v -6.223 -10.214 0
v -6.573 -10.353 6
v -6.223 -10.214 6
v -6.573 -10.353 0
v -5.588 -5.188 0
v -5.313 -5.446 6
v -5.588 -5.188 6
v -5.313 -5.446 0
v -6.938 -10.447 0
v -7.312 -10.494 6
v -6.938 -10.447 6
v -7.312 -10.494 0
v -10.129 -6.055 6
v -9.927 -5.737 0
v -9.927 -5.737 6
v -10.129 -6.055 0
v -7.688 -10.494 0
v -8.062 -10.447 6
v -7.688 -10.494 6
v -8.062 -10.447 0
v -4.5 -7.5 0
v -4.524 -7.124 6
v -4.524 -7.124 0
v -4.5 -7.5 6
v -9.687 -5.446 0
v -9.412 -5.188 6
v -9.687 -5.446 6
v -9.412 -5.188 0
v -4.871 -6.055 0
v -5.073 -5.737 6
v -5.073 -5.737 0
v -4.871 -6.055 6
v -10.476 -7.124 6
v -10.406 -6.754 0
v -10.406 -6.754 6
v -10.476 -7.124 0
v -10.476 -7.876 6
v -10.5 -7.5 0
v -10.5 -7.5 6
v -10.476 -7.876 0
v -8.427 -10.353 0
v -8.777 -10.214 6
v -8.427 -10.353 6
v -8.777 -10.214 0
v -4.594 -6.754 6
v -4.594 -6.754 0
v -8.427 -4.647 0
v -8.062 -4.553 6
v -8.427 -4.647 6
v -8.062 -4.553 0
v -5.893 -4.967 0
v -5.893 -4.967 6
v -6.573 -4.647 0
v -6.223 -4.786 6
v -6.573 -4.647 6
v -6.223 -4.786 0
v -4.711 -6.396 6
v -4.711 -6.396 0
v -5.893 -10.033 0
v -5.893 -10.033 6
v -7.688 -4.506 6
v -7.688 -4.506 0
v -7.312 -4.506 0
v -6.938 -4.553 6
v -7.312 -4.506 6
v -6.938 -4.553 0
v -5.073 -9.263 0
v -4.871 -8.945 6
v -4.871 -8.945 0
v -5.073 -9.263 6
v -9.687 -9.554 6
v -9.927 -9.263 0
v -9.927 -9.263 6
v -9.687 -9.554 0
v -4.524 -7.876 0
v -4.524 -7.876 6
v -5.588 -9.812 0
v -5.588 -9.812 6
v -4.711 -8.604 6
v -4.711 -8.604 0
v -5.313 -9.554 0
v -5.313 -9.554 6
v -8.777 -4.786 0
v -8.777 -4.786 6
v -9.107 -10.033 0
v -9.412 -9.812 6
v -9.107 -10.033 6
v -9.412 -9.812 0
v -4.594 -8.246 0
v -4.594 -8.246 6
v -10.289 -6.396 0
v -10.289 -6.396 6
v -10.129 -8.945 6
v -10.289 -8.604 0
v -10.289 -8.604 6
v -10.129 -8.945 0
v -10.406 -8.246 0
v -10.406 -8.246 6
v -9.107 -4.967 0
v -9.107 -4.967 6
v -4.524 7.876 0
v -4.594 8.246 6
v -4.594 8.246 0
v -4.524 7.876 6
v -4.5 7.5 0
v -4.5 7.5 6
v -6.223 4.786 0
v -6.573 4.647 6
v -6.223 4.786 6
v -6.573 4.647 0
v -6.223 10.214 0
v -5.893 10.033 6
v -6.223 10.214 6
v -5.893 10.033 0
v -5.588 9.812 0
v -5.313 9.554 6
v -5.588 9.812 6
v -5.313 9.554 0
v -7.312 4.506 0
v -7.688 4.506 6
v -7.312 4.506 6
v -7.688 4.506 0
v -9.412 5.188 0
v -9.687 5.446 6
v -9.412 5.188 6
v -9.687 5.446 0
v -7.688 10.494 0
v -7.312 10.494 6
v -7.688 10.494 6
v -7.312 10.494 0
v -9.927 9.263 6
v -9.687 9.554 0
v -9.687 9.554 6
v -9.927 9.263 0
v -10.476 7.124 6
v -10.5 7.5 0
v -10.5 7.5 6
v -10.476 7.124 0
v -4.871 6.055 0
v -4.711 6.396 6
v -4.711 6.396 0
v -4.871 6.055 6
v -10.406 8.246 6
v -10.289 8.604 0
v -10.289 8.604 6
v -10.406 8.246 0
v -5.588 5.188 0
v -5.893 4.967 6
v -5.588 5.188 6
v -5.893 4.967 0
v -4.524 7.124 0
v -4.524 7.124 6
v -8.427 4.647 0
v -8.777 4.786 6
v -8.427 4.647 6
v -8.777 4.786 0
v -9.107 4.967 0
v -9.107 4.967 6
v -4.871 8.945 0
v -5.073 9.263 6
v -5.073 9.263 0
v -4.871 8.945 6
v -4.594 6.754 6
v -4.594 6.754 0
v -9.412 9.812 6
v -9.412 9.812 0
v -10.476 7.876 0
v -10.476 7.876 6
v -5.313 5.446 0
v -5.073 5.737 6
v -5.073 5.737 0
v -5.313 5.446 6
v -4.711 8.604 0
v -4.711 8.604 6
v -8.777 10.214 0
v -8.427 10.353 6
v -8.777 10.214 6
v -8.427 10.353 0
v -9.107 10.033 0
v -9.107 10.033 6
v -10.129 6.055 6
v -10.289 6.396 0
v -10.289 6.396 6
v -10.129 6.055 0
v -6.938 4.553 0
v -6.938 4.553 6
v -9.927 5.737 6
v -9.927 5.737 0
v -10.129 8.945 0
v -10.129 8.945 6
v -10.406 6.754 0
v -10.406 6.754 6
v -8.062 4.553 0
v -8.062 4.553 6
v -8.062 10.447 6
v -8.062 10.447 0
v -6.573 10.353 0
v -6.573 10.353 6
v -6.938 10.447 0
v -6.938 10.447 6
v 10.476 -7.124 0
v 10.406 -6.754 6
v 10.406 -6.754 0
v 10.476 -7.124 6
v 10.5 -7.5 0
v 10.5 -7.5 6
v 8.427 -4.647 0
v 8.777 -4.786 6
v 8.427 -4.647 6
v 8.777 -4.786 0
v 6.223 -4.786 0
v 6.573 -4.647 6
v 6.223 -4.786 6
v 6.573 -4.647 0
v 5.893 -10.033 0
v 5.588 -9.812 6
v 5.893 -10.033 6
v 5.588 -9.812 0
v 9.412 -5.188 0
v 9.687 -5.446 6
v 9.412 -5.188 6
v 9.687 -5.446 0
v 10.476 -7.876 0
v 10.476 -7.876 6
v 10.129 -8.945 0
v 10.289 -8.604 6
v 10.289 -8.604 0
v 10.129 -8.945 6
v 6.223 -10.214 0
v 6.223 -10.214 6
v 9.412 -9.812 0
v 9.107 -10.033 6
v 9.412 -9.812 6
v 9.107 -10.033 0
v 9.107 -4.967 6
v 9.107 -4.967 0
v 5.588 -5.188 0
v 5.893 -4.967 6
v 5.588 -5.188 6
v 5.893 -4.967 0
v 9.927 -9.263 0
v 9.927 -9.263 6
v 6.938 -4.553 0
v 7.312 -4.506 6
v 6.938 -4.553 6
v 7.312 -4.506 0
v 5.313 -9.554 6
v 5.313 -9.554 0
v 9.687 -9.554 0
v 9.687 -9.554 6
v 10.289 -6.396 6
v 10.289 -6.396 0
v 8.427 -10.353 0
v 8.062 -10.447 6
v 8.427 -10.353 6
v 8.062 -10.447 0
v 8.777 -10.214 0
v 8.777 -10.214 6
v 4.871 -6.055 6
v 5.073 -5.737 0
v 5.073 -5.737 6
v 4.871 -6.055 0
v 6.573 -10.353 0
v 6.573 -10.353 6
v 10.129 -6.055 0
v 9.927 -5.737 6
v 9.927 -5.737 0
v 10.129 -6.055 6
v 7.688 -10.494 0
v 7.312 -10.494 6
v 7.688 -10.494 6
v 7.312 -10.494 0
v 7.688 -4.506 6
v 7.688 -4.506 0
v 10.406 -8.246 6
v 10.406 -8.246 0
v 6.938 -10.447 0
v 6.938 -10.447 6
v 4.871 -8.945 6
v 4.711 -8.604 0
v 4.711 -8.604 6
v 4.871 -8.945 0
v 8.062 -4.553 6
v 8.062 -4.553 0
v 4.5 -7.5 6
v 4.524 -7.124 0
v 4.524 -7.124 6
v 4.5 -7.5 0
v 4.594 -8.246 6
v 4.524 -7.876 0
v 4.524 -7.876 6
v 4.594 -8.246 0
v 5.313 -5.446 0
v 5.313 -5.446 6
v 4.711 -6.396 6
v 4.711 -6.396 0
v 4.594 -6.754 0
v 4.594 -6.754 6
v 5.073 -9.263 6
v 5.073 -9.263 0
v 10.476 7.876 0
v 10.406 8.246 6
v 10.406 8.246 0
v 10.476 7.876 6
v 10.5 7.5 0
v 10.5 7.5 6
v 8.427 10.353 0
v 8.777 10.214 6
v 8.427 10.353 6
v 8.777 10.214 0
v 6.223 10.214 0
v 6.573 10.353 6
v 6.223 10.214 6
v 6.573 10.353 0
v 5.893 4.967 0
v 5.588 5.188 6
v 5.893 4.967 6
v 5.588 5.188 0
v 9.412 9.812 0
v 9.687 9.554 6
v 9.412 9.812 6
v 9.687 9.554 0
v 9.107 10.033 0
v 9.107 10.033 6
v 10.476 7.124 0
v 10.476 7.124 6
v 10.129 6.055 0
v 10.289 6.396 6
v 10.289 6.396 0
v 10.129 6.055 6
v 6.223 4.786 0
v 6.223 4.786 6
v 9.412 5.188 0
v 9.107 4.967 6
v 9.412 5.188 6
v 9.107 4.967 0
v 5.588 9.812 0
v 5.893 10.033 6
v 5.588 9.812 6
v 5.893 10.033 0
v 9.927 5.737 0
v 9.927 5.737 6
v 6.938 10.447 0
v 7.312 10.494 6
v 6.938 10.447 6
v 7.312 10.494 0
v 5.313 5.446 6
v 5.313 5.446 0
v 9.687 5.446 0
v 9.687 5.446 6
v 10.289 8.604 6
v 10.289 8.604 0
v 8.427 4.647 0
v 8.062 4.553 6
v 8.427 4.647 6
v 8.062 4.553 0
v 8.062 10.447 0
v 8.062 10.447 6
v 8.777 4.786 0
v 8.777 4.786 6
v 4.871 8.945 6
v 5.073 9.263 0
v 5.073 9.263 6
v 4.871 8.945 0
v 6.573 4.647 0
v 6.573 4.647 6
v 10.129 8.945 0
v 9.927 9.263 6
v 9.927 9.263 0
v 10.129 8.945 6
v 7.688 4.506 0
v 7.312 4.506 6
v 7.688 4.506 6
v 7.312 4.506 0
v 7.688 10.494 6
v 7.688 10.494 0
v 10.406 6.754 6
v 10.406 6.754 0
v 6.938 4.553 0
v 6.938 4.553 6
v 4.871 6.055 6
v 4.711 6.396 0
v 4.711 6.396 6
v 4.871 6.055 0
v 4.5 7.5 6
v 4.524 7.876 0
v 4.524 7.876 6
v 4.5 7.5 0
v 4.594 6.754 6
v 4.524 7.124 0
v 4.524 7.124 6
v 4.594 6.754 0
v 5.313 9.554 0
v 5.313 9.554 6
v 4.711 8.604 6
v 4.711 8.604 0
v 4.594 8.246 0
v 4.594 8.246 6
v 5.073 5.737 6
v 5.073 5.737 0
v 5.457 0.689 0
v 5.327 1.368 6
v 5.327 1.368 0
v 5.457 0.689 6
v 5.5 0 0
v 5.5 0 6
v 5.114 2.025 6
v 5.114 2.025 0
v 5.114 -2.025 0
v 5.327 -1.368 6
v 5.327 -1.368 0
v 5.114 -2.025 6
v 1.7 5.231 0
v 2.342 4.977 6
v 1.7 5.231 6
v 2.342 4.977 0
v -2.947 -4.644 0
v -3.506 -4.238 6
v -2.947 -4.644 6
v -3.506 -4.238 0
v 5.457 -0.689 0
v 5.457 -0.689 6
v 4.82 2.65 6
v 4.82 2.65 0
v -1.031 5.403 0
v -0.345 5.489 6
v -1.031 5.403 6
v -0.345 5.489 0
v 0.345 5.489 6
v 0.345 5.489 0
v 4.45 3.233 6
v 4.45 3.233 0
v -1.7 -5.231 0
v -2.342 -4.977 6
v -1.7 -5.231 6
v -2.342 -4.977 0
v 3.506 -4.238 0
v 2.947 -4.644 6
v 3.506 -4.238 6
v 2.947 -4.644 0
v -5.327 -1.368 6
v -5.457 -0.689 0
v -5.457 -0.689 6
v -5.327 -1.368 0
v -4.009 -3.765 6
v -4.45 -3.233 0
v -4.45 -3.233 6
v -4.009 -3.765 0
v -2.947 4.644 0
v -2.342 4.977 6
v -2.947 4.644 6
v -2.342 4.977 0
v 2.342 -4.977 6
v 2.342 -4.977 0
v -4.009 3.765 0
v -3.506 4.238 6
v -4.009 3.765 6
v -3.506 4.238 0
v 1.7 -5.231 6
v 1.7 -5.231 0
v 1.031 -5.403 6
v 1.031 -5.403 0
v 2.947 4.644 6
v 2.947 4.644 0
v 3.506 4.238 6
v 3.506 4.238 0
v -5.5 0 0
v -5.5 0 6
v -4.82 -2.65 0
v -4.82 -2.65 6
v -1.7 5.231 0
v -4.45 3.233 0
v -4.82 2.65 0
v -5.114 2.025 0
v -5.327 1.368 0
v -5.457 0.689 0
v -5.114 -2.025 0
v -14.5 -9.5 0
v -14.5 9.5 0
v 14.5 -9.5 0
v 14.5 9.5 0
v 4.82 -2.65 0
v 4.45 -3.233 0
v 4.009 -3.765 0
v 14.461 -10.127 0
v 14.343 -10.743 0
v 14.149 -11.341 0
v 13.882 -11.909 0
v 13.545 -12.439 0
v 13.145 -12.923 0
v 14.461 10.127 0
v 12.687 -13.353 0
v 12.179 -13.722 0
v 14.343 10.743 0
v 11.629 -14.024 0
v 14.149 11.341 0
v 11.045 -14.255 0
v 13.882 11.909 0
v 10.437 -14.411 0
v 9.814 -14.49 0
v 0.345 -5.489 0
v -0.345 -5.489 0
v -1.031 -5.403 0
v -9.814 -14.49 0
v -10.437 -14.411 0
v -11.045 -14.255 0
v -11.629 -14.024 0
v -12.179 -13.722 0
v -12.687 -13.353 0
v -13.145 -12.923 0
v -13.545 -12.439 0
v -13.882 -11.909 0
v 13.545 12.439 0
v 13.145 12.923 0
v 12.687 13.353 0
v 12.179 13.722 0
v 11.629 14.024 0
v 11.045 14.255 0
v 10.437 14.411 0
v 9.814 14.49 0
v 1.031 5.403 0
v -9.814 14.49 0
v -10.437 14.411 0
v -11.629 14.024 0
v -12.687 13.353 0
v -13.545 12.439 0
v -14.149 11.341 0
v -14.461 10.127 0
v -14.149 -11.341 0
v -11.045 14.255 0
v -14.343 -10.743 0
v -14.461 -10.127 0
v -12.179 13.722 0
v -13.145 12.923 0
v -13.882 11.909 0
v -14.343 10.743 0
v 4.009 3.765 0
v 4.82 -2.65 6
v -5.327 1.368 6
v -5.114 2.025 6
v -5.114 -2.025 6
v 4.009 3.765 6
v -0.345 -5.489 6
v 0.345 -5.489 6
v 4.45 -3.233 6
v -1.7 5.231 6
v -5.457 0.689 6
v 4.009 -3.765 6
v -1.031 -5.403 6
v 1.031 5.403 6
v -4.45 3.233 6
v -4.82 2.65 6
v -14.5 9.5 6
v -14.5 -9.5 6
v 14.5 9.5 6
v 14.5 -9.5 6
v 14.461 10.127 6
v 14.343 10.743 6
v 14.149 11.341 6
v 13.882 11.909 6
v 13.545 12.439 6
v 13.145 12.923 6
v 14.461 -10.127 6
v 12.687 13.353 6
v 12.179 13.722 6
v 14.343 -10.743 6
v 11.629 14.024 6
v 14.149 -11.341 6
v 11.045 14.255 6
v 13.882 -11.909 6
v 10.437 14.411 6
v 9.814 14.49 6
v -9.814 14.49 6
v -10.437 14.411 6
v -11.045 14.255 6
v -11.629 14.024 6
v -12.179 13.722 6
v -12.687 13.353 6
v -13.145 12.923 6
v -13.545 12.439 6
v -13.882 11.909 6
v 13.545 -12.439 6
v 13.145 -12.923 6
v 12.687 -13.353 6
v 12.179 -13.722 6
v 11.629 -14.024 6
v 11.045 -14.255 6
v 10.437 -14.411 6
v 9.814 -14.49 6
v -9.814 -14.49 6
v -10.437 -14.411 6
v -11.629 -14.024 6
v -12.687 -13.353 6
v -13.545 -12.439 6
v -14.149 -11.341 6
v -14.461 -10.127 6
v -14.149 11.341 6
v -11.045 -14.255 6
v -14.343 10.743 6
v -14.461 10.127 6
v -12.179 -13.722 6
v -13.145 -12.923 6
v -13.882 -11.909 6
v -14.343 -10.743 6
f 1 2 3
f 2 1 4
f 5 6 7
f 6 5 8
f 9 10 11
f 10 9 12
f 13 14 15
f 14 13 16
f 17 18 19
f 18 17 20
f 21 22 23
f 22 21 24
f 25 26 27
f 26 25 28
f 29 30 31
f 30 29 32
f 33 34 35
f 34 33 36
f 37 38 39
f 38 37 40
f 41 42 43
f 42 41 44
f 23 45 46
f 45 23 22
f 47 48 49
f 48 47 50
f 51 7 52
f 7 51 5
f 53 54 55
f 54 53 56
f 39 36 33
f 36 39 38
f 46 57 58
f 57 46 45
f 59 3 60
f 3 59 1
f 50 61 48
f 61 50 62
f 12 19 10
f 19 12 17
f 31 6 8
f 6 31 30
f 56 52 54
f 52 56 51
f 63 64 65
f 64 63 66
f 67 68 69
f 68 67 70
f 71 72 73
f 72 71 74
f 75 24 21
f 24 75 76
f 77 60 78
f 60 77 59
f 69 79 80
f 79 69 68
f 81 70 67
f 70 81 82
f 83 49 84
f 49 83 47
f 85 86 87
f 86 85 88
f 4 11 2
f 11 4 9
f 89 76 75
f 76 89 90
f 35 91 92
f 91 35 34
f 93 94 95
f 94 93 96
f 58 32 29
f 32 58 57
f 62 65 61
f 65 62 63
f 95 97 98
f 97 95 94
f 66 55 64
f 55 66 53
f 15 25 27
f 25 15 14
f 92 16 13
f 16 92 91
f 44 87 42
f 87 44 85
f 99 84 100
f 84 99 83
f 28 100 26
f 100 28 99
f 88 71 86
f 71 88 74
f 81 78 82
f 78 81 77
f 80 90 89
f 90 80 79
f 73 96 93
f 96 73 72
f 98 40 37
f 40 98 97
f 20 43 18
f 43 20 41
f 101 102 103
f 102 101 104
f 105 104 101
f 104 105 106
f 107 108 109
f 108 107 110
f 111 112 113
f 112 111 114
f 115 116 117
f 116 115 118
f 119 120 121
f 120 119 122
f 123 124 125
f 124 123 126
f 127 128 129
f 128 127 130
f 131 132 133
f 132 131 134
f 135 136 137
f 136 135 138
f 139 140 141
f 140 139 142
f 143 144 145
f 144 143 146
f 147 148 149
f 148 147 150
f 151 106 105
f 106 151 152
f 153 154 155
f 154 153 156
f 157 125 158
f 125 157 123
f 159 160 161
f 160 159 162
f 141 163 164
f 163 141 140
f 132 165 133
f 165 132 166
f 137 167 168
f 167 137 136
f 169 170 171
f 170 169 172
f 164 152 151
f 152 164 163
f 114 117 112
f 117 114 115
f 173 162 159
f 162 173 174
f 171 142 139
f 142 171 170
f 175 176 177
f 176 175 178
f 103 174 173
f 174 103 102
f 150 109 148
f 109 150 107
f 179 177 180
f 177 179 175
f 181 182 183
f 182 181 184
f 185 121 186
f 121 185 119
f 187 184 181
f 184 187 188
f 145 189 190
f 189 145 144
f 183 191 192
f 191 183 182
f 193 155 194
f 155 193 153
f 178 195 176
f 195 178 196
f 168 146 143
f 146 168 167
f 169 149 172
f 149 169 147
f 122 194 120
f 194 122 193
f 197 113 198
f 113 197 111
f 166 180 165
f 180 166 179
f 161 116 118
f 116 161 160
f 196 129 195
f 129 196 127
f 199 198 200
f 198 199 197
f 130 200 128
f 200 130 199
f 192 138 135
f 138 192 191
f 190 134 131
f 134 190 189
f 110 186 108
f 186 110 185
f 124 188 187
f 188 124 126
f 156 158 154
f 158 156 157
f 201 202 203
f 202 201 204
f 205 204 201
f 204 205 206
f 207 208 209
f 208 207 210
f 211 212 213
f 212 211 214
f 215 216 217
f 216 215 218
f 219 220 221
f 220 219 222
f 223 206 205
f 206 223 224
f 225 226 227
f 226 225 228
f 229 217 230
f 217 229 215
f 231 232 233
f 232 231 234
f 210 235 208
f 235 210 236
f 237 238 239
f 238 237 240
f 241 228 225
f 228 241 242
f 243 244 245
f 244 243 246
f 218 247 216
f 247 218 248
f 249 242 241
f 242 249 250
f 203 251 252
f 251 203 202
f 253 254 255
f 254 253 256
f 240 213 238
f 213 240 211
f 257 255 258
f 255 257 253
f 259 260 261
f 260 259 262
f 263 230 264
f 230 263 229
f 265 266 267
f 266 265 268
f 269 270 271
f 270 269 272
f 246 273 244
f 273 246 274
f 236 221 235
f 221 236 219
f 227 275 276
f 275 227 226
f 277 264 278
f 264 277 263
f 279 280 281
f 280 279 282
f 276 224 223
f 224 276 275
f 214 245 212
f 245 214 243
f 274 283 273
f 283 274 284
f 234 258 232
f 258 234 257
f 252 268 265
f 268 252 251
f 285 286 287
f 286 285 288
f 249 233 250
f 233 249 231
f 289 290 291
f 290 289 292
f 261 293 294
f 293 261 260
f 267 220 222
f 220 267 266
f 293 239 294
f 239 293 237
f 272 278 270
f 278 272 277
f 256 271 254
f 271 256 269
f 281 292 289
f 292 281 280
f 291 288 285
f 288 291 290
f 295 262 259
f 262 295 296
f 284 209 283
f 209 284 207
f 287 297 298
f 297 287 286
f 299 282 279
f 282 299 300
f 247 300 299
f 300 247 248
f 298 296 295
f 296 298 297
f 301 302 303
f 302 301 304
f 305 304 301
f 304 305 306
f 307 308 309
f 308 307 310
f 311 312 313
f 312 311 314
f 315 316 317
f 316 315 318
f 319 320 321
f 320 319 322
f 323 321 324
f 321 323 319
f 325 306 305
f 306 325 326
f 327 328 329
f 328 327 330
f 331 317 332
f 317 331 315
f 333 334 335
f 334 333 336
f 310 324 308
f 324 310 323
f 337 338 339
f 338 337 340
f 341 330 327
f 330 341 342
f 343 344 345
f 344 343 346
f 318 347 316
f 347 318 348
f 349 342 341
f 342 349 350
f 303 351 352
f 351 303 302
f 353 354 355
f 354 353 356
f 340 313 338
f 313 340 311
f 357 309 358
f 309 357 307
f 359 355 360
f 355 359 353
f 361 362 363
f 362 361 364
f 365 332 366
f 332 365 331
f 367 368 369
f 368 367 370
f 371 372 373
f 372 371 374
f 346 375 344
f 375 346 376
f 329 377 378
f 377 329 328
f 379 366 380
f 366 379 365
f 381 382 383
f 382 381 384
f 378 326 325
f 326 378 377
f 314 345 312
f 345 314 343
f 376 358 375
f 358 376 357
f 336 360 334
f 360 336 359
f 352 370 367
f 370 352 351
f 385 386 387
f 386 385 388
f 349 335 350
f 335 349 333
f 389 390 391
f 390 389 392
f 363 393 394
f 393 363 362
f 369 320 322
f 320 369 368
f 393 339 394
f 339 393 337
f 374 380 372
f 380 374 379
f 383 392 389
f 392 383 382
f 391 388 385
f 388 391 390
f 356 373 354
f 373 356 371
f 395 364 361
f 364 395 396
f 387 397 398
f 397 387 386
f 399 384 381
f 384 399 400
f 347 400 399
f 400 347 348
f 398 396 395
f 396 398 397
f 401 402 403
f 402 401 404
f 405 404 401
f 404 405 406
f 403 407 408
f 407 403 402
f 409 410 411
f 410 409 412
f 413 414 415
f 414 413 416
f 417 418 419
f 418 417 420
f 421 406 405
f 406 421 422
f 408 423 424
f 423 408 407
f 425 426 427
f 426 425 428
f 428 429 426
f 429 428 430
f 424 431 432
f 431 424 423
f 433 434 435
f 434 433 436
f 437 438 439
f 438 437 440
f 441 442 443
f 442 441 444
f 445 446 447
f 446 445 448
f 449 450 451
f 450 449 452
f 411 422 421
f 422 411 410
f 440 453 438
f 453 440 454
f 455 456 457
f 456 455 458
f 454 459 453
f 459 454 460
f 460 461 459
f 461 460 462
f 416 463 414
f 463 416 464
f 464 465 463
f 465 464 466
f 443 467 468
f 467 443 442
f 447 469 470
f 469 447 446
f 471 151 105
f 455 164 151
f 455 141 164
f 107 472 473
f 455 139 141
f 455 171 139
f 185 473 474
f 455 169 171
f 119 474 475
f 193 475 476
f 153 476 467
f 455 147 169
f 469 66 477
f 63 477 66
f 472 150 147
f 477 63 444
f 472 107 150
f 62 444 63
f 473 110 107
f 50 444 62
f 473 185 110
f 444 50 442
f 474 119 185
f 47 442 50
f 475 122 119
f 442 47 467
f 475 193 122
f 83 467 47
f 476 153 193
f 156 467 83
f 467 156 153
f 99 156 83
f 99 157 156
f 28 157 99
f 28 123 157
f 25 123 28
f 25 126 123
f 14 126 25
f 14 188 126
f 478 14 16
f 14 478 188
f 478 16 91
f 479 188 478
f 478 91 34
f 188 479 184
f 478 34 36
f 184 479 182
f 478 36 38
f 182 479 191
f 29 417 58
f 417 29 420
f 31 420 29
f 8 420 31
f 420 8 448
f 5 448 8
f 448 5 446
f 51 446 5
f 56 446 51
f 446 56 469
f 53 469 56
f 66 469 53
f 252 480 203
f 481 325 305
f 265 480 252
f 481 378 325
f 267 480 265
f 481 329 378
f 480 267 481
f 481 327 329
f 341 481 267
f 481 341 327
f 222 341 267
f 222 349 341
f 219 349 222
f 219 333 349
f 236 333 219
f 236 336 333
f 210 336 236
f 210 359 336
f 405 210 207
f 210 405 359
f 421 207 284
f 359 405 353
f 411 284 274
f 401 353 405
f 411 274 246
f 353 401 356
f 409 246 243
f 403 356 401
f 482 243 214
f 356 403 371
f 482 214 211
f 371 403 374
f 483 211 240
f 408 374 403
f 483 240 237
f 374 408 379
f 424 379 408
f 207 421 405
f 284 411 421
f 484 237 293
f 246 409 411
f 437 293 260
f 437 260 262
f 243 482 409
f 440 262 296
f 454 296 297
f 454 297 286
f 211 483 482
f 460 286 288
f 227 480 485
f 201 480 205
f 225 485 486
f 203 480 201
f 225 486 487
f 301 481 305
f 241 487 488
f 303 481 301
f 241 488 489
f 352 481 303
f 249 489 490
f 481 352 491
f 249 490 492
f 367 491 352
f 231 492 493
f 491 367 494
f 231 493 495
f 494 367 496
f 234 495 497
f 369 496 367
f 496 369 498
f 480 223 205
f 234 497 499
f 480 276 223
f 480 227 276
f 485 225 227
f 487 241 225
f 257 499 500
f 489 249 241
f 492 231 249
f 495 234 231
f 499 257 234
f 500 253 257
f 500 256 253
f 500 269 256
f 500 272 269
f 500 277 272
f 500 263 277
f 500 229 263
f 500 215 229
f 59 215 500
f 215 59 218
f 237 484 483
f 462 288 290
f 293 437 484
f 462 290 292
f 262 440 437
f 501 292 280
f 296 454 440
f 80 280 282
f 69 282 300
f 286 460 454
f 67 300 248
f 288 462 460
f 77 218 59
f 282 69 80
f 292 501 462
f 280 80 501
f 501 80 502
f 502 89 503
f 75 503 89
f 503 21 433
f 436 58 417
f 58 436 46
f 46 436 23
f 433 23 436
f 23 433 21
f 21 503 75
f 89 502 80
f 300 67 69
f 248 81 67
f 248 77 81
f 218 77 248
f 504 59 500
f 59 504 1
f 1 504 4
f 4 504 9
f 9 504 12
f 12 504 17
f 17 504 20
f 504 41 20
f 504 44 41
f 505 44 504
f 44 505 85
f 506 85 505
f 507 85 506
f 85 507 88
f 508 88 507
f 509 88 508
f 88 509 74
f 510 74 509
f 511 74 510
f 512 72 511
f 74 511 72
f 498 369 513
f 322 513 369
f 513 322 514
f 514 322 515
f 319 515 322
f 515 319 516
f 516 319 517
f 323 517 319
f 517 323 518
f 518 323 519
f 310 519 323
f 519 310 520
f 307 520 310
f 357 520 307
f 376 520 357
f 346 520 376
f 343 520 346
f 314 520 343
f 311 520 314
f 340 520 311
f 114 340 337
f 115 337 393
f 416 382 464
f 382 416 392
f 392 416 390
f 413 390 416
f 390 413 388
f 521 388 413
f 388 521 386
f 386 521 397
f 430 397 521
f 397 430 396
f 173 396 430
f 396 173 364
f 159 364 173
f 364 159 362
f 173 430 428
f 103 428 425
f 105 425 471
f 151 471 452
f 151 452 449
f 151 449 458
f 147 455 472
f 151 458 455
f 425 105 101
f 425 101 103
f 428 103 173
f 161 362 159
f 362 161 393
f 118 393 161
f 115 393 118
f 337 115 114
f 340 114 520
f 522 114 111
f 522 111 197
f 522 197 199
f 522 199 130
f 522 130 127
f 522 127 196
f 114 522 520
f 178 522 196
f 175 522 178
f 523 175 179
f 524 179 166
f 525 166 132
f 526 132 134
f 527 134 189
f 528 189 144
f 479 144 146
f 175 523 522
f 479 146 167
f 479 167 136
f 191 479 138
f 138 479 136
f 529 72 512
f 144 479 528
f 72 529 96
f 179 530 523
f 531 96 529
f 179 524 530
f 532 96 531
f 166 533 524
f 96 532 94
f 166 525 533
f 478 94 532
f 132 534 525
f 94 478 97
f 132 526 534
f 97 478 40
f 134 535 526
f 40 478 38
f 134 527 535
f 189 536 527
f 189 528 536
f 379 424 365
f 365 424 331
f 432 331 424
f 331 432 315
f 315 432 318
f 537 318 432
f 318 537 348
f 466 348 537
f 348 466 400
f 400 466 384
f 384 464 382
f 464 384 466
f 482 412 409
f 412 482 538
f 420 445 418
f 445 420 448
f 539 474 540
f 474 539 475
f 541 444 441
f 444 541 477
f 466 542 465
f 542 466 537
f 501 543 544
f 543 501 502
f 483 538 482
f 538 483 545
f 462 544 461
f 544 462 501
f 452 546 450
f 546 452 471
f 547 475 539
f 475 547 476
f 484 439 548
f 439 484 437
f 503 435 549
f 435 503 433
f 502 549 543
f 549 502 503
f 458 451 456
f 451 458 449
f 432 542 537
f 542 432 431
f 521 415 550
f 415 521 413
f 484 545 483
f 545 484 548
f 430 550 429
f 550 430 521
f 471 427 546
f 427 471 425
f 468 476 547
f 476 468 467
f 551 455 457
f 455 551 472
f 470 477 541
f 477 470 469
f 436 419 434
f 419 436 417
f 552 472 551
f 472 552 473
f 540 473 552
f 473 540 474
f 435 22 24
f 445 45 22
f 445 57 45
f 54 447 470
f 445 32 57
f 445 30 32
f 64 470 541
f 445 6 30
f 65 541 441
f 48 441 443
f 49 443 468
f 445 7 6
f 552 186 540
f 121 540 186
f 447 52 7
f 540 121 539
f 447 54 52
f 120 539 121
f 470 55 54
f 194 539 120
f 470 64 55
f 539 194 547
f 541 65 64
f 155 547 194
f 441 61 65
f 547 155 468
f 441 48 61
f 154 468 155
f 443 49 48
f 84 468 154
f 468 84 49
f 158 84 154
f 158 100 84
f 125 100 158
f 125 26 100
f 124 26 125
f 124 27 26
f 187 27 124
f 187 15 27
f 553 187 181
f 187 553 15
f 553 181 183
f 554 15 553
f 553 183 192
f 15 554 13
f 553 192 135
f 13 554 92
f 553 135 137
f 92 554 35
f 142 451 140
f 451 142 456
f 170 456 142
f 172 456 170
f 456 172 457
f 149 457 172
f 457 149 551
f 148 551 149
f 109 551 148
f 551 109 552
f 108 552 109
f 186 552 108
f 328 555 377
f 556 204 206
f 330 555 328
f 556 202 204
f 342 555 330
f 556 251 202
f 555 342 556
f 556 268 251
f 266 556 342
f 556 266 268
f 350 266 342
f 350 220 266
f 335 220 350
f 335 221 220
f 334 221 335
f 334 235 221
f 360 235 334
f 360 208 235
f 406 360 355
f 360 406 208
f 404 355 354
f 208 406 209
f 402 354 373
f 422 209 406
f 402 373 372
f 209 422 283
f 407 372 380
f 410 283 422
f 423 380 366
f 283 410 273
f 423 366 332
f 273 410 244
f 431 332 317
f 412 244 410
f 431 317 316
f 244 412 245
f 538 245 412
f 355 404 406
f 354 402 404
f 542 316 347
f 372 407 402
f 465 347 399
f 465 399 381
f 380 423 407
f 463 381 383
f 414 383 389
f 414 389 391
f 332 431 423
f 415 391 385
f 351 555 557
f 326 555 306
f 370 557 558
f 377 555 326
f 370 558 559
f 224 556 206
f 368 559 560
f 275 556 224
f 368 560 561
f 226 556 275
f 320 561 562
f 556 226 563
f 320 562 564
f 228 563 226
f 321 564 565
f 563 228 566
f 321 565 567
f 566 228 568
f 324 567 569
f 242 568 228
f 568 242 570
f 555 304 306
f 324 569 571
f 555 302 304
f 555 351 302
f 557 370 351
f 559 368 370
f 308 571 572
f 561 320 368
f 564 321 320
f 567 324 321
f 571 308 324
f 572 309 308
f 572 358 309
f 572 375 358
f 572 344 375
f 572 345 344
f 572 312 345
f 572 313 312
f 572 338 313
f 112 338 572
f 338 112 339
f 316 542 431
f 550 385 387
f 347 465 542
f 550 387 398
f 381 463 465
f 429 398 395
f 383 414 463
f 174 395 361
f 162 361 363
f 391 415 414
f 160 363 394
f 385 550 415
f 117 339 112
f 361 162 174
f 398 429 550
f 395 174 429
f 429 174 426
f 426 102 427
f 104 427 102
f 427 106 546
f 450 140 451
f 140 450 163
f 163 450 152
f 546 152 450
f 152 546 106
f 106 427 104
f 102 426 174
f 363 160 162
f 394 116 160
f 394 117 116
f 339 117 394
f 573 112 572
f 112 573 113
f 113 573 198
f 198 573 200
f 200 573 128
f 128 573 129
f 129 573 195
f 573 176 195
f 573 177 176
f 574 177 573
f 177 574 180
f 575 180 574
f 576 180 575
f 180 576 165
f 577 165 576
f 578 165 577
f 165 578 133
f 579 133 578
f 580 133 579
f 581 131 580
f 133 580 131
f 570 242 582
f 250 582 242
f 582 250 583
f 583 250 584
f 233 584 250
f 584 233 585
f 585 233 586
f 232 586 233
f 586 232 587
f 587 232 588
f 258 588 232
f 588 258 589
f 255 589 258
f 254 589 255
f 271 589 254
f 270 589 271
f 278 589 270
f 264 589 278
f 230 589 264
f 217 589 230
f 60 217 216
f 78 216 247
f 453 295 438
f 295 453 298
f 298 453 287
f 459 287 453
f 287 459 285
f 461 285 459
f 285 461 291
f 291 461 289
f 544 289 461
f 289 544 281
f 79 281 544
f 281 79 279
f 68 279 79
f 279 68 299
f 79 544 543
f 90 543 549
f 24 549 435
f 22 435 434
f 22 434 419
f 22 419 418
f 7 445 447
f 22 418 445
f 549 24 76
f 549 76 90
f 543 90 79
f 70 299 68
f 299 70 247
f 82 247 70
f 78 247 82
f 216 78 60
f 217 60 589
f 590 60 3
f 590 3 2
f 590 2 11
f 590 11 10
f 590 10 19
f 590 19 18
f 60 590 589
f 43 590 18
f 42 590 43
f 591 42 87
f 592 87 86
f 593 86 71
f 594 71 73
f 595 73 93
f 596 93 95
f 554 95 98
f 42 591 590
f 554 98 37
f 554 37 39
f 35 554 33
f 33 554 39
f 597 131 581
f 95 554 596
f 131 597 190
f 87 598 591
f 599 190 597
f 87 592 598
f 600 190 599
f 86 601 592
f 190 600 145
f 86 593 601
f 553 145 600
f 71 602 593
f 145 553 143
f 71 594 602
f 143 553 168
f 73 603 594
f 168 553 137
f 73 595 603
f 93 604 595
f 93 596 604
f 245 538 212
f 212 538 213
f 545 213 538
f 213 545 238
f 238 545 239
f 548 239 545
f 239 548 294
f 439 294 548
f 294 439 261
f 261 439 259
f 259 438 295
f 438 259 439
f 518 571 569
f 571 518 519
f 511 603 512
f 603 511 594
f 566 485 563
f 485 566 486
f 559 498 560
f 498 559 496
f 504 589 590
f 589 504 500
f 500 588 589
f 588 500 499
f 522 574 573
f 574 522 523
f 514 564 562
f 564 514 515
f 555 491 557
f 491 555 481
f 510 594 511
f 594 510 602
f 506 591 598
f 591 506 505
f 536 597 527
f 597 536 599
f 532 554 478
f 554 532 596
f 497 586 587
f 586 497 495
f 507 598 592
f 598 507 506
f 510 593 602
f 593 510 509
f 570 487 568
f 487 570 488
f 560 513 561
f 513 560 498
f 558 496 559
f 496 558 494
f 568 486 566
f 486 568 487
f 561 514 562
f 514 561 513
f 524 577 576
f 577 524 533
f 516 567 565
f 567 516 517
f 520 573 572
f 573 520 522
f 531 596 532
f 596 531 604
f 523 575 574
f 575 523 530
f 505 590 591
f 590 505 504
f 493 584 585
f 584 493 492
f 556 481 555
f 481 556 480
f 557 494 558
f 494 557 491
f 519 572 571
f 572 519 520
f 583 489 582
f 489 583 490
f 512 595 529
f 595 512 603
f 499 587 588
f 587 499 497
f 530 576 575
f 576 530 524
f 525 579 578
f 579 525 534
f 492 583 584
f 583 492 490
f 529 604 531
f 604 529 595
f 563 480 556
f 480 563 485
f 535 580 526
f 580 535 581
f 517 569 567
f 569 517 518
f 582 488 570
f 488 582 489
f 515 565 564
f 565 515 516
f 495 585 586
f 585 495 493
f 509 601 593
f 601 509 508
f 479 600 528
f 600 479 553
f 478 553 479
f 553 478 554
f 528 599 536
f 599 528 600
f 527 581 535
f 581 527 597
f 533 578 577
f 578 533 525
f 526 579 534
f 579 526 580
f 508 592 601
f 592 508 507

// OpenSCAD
$fn = 50;


difference() {
	union() {
		hull() {
			translate(v = [-9.5000000000, 9.5000000000, 0]) {
				cylinder(h = 6, r = 5);
			}
			translate(v = [9.5000000000, 9.5000000000, 0]) {
				cylinder(h = 6, r = 5);
			}
			translate(v = [-9.5000000000, -9.5000000000, 0]) {
				cylinder(h = 6, r = 5);
			}
			translate(v = [9.5000000000, -9.5000000000, 0]) {
				cylinder(h = 6, r = 5);
			}
		}
	}
	union() {
		#translate(v = [-7.5000000000, -7.5000000000, -100.0000000000]) {
			cylinder(h = 200, r = 3.0000000000);
		}
		#translate(v = [-7.5000000000, 7.5000000000, -100.0000000000]) {
			cylinder(h = 200, r = 3.0000000000);
		}
		#translate(v = [7.5000000000, -7.5000000000, -100.0000000000]) {
			cylinder(h = 200, r = 3.0000000000);
		}
		#translate(v = [7.5000000000, 7.5000000000, -100.0000000000]) {
			cylinder(h = 200, r = 3.0000000000);
		}
		#cylinder(h = 6, r = 5.5000000000);
	}
}
